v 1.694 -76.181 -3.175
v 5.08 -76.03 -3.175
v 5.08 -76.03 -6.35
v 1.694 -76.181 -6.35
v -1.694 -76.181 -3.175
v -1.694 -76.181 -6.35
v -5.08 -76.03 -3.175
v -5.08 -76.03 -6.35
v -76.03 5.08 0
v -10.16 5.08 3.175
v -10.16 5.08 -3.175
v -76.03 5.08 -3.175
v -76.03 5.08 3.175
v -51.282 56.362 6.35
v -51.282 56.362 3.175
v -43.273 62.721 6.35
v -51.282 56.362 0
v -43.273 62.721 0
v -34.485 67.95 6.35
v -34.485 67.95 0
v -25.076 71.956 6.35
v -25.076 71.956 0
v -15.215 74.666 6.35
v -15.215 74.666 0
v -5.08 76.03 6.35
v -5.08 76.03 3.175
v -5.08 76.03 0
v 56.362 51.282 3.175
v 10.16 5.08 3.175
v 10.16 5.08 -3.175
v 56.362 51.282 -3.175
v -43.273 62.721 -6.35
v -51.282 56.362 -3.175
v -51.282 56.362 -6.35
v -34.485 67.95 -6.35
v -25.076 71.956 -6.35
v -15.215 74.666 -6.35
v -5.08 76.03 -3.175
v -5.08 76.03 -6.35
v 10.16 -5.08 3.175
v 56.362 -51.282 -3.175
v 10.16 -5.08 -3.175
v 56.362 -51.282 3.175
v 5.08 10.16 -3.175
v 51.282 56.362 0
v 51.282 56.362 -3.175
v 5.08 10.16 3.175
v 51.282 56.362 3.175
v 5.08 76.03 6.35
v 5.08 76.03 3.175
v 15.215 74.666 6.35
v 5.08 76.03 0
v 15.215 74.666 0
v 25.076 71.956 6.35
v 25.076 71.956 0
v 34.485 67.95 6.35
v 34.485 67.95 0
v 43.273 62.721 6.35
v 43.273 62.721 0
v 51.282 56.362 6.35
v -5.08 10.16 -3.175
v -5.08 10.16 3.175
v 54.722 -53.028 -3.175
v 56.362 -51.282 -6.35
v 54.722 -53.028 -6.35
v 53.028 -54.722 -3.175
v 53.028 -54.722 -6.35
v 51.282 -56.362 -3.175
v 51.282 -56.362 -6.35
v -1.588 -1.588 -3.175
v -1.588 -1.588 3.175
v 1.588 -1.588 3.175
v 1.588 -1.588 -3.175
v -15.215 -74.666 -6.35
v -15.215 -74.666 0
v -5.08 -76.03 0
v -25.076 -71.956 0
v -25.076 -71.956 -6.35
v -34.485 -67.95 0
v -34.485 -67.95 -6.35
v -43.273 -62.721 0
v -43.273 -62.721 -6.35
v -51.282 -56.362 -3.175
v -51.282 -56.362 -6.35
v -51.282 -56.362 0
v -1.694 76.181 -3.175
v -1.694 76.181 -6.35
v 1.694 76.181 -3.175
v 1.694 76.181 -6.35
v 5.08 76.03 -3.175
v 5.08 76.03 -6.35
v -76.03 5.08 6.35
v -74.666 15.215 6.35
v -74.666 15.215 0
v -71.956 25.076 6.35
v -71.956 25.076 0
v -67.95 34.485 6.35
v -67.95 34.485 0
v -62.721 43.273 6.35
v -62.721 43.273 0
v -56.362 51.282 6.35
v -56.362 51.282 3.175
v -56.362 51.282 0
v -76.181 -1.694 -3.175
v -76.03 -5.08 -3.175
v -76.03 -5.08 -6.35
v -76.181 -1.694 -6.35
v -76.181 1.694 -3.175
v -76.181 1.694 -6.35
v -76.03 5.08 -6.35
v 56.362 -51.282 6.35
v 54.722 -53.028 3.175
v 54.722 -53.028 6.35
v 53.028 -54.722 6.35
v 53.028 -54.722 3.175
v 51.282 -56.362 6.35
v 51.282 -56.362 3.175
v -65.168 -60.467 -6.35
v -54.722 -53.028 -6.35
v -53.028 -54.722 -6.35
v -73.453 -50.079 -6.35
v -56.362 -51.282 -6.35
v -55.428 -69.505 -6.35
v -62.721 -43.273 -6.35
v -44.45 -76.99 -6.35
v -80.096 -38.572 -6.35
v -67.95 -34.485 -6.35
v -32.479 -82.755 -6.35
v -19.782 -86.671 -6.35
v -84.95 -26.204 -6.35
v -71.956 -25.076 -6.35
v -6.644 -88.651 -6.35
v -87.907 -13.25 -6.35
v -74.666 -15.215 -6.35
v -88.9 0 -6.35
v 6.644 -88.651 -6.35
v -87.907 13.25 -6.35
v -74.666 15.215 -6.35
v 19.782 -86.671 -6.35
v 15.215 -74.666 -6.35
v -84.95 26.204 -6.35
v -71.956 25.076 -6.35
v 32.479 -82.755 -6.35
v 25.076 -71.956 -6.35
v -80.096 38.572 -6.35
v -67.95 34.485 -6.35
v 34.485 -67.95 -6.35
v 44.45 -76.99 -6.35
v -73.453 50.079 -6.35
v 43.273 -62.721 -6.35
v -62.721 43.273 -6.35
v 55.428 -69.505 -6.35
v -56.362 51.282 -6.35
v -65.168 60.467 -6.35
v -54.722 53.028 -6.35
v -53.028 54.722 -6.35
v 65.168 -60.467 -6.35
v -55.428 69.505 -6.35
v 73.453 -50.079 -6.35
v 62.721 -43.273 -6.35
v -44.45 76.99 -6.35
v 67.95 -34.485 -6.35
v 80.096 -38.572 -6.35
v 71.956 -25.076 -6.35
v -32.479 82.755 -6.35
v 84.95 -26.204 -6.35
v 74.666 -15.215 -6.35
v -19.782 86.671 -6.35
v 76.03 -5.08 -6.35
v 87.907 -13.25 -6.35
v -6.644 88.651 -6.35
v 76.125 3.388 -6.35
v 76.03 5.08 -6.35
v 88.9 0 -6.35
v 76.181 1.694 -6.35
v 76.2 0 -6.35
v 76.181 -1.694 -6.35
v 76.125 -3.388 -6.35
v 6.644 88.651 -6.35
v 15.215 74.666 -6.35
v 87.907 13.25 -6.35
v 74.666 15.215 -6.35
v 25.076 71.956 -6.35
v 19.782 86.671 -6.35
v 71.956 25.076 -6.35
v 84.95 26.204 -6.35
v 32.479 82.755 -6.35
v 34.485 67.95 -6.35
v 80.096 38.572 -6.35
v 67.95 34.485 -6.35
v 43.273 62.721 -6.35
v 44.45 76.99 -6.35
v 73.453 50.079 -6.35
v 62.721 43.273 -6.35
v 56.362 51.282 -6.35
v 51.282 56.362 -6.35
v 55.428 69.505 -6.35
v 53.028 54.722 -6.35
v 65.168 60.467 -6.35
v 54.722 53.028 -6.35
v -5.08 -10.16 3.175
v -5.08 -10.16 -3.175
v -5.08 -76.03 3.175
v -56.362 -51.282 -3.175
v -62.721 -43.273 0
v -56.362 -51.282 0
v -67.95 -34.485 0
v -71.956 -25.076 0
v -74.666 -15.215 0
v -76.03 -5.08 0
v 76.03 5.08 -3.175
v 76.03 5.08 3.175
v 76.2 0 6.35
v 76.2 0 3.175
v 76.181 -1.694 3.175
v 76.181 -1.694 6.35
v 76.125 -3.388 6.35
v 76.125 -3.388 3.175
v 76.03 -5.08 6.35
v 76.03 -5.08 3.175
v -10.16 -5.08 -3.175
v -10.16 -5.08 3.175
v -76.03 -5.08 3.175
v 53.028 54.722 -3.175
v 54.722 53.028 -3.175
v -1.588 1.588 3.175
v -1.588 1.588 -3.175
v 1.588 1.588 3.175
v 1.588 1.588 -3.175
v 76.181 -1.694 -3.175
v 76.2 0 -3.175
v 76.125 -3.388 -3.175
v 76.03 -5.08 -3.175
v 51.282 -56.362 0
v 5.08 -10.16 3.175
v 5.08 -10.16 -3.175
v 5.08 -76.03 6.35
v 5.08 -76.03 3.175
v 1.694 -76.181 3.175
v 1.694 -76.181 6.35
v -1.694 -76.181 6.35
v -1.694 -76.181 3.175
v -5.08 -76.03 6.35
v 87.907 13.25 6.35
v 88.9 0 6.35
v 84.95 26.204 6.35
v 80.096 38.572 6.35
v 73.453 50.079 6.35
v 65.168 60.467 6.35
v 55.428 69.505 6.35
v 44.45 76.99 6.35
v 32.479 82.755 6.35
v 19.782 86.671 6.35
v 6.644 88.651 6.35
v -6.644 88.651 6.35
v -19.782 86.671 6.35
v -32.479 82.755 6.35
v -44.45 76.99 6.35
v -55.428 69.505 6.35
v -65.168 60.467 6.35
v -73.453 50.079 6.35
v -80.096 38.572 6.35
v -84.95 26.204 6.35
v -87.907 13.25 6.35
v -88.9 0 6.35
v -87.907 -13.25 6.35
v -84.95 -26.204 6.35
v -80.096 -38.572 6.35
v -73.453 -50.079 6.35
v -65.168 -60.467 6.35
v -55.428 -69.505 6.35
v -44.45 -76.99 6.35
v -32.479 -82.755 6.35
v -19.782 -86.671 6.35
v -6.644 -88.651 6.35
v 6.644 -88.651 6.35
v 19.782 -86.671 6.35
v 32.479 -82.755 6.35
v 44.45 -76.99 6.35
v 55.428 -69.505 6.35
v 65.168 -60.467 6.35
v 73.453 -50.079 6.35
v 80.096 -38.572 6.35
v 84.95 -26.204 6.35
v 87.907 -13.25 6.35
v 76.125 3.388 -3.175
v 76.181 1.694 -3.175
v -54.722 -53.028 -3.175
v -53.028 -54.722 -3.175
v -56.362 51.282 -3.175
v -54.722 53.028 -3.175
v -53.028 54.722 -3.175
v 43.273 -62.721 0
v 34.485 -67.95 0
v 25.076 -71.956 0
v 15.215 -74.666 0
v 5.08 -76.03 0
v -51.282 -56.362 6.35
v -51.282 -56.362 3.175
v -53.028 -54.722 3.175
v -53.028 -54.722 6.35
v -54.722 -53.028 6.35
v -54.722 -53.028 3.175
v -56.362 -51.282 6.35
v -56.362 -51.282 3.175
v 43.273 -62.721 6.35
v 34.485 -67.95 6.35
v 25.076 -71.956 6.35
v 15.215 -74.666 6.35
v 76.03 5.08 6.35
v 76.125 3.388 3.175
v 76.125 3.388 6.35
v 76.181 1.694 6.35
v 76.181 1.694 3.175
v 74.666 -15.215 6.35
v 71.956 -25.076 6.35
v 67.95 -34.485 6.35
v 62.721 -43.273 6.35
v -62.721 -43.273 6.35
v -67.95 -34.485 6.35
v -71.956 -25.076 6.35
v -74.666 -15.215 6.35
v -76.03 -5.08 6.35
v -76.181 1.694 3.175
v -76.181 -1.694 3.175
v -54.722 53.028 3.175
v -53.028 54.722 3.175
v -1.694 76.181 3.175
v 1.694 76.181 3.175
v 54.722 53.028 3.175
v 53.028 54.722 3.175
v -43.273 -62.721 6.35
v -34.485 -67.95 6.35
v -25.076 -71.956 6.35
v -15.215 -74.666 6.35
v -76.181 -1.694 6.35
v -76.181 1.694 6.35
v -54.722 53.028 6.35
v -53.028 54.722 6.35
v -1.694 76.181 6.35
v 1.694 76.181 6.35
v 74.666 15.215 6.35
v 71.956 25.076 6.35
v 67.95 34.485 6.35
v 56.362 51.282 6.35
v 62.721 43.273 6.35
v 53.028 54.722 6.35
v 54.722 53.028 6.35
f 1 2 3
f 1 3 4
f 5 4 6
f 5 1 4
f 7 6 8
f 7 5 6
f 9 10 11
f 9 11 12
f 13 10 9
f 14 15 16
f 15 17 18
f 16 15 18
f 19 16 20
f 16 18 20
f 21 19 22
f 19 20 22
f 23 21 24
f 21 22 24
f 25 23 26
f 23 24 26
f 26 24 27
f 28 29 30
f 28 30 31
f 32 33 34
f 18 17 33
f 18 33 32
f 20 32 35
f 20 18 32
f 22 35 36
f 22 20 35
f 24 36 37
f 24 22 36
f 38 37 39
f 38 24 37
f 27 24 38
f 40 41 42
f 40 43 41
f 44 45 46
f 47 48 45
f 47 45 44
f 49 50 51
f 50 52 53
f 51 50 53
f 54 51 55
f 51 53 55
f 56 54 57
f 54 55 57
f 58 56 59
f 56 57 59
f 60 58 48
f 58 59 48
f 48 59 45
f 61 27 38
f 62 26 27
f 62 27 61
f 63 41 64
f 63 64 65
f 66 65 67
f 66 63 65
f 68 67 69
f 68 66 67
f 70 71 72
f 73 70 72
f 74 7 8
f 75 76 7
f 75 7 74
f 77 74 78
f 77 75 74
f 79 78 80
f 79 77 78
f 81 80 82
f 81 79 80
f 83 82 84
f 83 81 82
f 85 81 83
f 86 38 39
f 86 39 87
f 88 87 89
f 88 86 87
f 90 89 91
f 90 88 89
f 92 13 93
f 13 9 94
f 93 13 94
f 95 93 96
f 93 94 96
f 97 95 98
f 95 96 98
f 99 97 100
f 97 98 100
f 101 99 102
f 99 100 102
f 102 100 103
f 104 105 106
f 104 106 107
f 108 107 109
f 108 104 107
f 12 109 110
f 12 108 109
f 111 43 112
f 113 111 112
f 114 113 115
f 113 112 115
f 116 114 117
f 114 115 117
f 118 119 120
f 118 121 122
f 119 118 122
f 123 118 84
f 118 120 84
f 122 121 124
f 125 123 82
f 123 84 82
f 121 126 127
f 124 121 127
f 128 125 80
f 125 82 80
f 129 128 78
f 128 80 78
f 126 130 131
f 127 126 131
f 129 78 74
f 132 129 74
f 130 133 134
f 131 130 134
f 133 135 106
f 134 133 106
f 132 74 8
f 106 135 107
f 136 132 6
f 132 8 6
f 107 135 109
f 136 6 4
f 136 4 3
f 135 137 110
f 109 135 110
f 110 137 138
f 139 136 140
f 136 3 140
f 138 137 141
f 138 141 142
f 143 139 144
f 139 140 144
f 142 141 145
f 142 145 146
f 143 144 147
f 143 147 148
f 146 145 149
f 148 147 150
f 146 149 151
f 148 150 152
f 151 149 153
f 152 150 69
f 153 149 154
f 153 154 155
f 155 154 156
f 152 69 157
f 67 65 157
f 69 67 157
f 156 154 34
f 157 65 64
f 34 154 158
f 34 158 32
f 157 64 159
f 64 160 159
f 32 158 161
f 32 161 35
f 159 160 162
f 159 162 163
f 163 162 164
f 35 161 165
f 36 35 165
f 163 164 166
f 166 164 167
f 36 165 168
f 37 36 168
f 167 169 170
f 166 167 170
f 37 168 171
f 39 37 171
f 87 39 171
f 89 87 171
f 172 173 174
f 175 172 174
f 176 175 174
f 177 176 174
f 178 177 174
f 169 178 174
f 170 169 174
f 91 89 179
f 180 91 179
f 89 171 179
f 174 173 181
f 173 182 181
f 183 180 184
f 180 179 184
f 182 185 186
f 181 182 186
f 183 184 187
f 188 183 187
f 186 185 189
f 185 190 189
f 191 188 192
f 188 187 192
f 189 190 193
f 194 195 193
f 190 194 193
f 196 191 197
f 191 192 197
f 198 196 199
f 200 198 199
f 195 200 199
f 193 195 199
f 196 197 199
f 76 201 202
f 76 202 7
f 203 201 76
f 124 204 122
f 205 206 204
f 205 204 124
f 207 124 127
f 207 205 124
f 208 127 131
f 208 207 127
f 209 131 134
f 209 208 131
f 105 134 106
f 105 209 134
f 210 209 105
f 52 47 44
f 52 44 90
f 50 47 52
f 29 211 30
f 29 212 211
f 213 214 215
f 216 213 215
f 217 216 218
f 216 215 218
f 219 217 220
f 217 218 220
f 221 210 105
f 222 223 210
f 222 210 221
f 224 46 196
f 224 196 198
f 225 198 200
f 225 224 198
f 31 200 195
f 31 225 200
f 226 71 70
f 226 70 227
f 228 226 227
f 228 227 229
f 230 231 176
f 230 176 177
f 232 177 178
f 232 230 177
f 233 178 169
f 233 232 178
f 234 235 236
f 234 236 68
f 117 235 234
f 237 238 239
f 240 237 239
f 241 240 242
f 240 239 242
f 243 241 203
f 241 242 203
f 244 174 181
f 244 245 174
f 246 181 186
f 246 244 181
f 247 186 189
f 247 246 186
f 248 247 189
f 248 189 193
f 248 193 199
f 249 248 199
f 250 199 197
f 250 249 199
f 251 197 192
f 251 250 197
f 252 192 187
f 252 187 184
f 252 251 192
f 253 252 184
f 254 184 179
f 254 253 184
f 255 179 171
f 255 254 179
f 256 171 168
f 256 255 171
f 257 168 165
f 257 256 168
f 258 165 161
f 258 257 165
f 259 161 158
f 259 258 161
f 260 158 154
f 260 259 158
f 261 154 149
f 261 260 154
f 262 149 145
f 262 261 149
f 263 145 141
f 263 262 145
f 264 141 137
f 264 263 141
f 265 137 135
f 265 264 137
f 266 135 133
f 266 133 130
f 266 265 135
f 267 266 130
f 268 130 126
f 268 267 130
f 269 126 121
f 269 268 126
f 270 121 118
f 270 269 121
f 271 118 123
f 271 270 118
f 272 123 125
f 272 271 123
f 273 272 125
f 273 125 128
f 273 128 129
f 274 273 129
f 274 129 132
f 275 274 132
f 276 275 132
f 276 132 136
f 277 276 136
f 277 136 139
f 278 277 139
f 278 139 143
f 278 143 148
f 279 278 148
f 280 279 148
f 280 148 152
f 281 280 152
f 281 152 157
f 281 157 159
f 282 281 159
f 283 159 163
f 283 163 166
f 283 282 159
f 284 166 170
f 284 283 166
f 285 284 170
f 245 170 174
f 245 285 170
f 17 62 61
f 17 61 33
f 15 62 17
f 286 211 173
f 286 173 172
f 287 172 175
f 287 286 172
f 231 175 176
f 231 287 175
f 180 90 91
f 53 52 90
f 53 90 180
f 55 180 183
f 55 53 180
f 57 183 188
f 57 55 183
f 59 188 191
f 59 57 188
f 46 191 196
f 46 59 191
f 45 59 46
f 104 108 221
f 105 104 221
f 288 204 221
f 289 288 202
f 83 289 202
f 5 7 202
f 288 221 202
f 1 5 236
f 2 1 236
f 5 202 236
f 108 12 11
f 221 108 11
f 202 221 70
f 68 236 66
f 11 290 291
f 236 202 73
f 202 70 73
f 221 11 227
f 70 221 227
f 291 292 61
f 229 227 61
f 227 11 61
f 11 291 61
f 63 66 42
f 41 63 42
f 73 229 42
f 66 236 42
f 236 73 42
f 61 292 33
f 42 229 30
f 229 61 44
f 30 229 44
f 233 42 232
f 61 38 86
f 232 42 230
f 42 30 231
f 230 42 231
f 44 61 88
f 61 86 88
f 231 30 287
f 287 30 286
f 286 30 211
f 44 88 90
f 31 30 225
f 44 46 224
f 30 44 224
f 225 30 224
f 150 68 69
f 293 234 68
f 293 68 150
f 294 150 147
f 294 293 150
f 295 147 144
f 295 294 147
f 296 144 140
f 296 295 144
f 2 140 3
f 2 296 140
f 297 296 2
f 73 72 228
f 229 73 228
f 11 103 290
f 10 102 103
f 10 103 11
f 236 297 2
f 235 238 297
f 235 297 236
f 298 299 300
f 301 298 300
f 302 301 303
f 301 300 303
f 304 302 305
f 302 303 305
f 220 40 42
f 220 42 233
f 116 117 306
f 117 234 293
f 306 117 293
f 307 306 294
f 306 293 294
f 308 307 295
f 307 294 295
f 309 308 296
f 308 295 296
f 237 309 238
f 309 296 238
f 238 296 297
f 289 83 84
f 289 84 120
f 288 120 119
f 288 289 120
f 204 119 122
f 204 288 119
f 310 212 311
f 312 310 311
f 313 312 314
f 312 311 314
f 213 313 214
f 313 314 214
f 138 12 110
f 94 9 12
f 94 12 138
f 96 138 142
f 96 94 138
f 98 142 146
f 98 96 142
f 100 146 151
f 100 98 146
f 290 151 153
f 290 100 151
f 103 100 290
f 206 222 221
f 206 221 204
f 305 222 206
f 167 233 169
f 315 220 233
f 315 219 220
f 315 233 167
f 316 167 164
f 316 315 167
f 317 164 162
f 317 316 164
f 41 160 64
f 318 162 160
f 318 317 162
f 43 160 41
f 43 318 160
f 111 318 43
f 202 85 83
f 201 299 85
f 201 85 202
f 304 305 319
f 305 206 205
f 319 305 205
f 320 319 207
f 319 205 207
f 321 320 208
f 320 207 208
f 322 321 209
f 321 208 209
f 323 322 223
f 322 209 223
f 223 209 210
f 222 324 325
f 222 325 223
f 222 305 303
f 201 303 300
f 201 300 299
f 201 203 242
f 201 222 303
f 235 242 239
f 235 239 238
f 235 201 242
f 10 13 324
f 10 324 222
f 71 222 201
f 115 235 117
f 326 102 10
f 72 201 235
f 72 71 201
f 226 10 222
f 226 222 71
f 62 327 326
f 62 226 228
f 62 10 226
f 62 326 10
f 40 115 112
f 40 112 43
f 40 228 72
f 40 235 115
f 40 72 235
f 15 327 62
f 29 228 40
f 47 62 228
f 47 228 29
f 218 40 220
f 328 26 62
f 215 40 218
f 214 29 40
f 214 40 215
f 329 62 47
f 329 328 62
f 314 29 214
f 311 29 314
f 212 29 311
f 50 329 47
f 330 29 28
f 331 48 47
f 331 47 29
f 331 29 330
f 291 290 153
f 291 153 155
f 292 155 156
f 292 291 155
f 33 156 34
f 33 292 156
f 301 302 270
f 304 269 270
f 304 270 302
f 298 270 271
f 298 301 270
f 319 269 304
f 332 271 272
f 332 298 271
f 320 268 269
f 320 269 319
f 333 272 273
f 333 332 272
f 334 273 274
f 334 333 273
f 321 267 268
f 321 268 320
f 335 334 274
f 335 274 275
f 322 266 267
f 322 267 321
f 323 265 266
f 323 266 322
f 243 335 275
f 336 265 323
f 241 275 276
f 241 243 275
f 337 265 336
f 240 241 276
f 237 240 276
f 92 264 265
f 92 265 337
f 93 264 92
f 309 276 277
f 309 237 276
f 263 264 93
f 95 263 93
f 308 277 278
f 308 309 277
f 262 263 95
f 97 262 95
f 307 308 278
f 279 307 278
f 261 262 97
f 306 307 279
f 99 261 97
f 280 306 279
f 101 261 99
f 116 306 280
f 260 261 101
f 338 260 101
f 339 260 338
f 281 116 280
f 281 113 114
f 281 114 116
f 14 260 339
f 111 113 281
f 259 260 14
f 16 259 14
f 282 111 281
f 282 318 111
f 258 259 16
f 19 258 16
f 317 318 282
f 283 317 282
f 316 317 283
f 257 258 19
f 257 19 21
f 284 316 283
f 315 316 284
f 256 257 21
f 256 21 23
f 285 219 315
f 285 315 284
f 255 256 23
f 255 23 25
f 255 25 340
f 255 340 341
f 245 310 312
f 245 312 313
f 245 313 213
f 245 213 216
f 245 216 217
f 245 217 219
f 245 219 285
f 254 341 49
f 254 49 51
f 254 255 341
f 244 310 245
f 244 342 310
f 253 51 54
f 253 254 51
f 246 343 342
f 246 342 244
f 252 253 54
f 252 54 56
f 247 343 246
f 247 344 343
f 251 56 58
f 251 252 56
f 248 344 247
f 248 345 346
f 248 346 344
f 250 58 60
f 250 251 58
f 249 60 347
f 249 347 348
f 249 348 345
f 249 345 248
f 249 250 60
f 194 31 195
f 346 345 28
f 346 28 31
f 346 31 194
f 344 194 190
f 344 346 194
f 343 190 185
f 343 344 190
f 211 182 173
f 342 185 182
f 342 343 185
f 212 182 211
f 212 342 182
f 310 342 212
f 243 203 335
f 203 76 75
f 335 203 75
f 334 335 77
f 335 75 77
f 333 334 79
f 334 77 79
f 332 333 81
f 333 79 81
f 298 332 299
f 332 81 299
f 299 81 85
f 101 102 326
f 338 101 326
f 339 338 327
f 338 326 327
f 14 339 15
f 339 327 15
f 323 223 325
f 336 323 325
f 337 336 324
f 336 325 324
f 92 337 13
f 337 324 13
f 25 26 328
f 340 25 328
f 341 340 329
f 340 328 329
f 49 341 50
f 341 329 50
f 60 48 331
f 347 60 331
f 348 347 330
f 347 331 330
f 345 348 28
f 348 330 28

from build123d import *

# Parameters (mm, degrees)
F0_R          = 88.9
F1_DEPTH      = 6.35
F1_DEPTH_BACK = 6.35
F2_DEPTH      = 3.175
F2_DEPTH_BACK = 3.175
F3_W          = 3.175
F3_H          = 3.175
F4_DEPTH      = 127
F4_DEPTH_BACK = 25.4


with BuildPart() as f1:
    # F0 (on Top) → F1 (new body, two sides)
    with BuildSketch(Plane.XY) as f1_sk:
        Circle(F0_R)
        with BuildLine():
            ThreePointArc((76.0304780992, 5.08), (76.1576077328, 2.5414138621), (76.2, 0))
            ThreePointArc((76.2, 0), (76.1576077328, -2.5414138621), (76.0304780992, -5.08))
            ThreePointArc((76.0304780992, -5.08), (70.1110952475, -29.8475178733), (56.3616350551, -51.2816350551))
            ThreePointArc((56.3616350551, -51.2816350551), (53.8815367264, -53.8815367264), (51.2816350551, -56.3616350551))
            ThreePointArc((51.2816350551, -56.3616350551), (29.8475178733, -70.1110952475), (5.08, -76.0304780992))
            ThreePointArc((5.08, -76.0304780992), (0, -76.2), (-5.08, -76.0304780992))
            ThreePointArc((-5.08, -76.0304780992), (-29.8475178733, -70.1110952475), (-51.2816350551, -56.3616350551))
            ThreePointArc((-51.2816350551, -56.3616350551), (-53.8815367264, -53.8815367264), (-56.3616350551, -51.2816350551))
            ThreePointArc((-56.3616350551, -51.2816350551), (-70.1110952475, -29.8475178733), (-76.0304780992, -5.08))
            ThreePointArc((-76.0304780992, -5.08), (-76.2, 0), (-76.0304780992, 5.08))
            ThreePointArc((-76.0304780992, 5.08), (-70.1110952475, 29.8475178733), (-56.3616350551, 51.2816350551))
            ThreePointArc((-56.3616350551, 51.2816350551), (-53.8815367264, 53.8815367264), (-51.2816350551, 56.3616350551))
            ThreePointArc((-51.2816350551, 56.3616350551), (-29.8475178733, 70.1110952475), (-5.08, 76.0304780992))
            ThreePointArc((-5.08, 76.0304780992), (0, 76.2), (5.08, 76.0304780992))
            ThreePointArc((5.08, 76.0304780992), (29.8475178733, 70.1110952475), (51.2816350551, 56.3616350551))
            ThreePointArc((51.2816350551, 56.3616350551), (53.8815367264, 53.8815367264), (56.3616350551, 51.2816350551))
            ThreePointArc((56.3616350551, 51.2816350551), (70.1110952475, 29.8475178733), (76.0304780992, 5.08))
        make_face(mode=Mode.SUBTRACT)
    extrude(amount=F1_DEPTH)
    extrude(f1_sk.sketch, amount=-F1_DEPTH_BACK)

    # F0 (on Top) → F2 (join, two sides)
    with BuildSketch(Plane.XY) as f2_sk:
        with BuildLine():
            ThreePointArc((76.0304780992, -5.08), (76.1576077328, -2.5414138621), (76.2, 0))
            ThreePointArc((76.2, 0), (76.1576077328, 2.5414138621), (76.0304780992, 5.08))
            Line((76.0304780992, 5.08), (10.16, 5.08))
            Line((10.16, 5.08), (56.3616350551, 51.2816350551))
            ThreePointArc((56.3616350551, 51.2816350551), (53.8815367264, 53.8815367264), (51.2816350551, 56.3616350551))
            Line((51.2816350551, 56.3616350551), (5.08, 10.16))
            Line((5.08, 10.16), (5.08, 76.0304780992))
            ThreePointArc((5.08, 76.0304780992), (0, 76.2), (-5.08, 76.0304780992))
            Line((-5.08, 76.0304780992), (-5.08, 10.16))
            Line((-5.08, 10.16), (-51.2816350551, 56.3616350551))
            ThreePointArc((-51.2816350551, 56.3616350551), (-53.8815367264, 53.8815367264), (-56.3616350551, 51.2816350551))
            Line((-56.3616350551, 51.2816350551), (-10.16, 5.08))
            Line((-10.16, 5.08), (-76.0304780992, 5.08))
            ThreePointArc((-76.0304780992, 5.08), (-76.2, 0), (-76.0304780992, -5.08))
            Line((-76.0304780992, -5.08), (-10.16, -5.08))
            Line((-10.16, -5.08), (-56.3616350551, -51.2816350551))
            ThreePointArc((-56.3616350551, -51.2816350551), (-53.8815367264, -53.8815367264), (-51.2816350551, -56.3616350551))
            Line((-51.2816350551, -56.3616350551), (-5.08, -10.16))
            Line((-5.08, -10.16), (-5.08, -76.0304780992))
            ThreePointArc((-5.08, -76.0304780992), (0, -76.2), (5.08, -76.0304780992))
            Line((5.08, -76.0304780992), (5.08, -10.16))
            Line((5.08, -10.16), (51.2816350551, -56.3616350551))
            ThreePointArc((51.2816350551, -56.3616350551), (53.8815367264, -53.8815367264), (56.3616350551, -51.2816350551))
            Line((56.3616350551, -51.2816350551), (10.16, -5.08))
            Line((10.16, -5.08), (76.0304780992, -5.08))
        make_face()
    extrude(amount=F2_DEPTH)
    extrude(f2_sk.sketch, amount=-F2_DEPTH_BACK)

    # F3 (on face) → F4 (cut, two sides)
    with BuildSketch(Plane.XY) as f4_sk:
        Rectangle(F3_W, F3_H)
    extrude(amount=-F4_DEPTH, mode=Mode.SUBTRACT)
    extrude(f4_sk.sketch, amount=F4_DEPTH_BACK, mode=Mode.SUBTRACT)


solid = f1.part
